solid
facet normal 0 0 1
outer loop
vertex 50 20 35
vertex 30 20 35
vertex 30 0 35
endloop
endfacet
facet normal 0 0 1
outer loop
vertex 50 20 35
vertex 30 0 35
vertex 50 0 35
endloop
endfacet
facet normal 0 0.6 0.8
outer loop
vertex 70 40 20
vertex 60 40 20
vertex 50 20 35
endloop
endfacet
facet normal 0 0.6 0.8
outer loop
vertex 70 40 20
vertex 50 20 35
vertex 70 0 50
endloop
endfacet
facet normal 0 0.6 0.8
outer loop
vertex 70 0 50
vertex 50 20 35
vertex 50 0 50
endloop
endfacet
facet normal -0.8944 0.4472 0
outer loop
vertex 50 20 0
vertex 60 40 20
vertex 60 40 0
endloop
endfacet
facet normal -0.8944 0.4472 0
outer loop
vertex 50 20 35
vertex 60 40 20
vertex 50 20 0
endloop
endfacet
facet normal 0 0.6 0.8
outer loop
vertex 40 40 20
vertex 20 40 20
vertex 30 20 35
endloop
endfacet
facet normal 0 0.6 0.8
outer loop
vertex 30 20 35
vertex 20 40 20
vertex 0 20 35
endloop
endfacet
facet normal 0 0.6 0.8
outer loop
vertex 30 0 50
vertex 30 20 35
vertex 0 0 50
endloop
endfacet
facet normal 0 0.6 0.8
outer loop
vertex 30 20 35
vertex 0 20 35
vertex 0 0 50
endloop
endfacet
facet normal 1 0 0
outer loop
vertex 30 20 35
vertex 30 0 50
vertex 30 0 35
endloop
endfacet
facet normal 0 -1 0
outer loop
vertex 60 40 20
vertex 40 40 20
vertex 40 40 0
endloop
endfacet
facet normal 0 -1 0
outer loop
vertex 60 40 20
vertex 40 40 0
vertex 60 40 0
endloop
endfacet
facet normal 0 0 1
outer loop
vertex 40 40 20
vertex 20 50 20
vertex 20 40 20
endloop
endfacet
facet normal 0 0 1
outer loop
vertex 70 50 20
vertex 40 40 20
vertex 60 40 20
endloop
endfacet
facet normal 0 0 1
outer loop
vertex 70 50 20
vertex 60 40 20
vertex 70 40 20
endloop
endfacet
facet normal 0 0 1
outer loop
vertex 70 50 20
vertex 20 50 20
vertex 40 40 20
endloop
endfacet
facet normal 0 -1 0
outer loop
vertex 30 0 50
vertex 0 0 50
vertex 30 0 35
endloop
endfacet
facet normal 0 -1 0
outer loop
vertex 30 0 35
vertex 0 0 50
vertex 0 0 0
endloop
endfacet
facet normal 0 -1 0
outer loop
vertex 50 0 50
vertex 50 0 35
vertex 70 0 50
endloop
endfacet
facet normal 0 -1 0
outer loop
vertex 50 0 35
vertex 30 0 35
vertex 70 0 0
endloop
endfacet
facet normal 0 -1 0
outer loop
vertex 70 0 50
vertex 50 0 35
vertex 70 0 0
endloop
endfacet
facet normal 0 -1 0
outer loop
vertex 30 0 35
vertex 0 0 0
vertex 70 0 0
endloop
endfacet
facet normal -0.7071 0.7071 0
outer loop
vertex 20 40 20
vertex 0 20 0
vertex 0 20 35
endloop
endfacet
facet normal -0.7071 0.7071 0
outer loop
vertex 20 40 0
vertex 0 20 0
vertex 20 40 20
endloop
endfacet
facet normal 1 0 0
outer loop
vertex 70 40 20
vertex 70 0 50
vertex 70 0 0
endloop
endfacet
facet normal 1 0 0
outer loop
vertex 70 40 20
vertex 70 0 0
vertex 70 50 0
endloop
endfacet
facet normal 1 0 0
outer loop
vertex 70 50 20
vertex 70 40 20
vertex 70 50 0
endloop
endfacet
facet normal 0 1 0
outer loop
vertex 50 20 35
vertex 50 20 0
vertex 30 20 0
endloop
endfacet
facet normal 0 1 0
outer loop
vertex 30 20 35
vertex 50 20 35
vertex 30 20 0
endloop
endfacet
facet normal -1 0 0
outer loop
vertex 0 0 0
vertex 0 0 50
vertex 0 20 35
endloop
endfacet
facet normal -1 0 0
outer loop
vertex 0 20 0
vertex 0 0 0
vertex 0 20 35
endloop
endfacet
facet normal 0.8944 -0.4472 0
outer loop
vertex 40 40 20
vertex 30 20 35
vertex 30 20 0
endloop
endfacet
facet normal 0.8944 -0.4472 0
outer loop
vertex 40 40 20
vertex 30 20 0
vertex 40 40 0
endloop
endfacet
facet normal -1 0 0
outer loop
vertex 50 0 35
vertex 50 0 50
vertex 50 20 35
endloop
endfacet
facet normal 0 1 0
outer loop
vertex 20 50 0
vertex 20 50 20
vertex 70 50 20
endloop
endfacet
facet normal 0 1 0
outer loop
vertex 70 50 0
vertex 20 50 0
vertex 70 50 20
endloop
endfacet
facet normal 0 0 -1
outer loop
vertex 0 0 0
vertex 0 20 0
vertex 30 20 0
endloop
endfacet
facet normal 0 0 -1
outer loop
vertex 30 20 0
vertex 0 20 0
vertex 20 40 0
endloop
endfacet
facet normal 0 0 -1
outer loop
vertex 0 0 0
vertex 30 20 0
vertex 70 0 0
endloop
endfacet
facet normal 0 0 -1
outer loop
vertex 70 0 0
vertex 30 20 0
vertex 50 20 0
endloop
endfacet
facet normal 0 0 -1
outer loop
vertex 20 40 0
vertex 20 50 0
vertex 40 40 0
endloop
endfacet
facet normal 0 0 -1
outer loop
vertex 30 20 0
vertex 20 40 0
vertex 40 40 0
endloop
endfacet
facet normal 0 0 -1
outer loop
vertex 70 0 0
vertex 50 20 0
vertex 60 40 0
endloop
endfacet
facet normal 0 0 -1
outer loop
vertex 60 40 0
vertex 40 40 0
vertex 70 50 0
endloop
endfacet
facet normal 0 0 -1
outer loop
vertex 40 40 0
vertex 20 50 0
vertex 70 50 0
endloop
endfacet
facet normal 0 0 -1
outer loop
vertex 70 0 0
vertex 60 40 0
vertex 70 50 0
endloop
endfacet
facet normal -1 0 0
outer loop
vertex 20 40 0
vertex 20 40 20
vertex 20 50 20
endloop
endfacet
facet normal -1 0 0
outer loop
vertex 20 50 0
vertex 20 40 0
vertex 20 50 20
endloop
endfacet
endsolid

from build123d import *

# Parameters (mm, degrees)
BOSS_EXTRUDE1_DEPTH = 50
SKETCH2_W           = 20
SKETCH2_H           = 20
CUT_EXTRUDE1_DEPTH  = 20
CUT_EXTRUDE2_DEPTH  = 10
SKETCH4_W           = 50
SKETCH4_H           = 10
BOSS_EXTRUDE2_DEPTH = 50
SKETCH5_W           = 50
SKETCH5_H           = 10
CUT_EXTRUDE5_DEPTH  = 30
SKETCH6_W           = 20
SKETCH6_H           = 20
BOSS_EXTRUDE4_DEPTH = 5
CUT_EXTRUDE8_DEPTH  = 40
CUT_EXTRUDE9_DEPTH  = 70


with BuildPart() as part:
    # Sketch1 → Boss-Extrude1 (new body)
    with BuildSketch(Plane.XY):
        Polygon((0, 0), (0, 20), (20, 40), (70, 40), (70, 0), align=None)
    extrude(amount=BOSS_EXTRUDE1_DEPTH)

    # Sketch2 → Cut-Extrude1 (cut)
    with BuildSketch(Plane.XY.offset(50)):
        with Locations((40, 10)):
            Rectangle(SKETCH2_W, SKETCH2_H)
    extrude(amount=-CUT_EXTRUDE1_DEPTH, mode=Mode.SUBTRACT)

    # Sketch3 → Cut-Extrude2 (cut)
    with BuildSketch(Plane.XY.offset(50)):
        Polygon((30, 20), (40, 40), (60, 40), (50, 20), align=None)
    extrude(amount=-CUT_EXTRUDE2_DEPTH, mode=Mode.SUBTRACT)

    # Sketch4 → Boss-Extrude2 (add)
    with BuildSketch(Plane.XY.offset(50)):
        with Locations((45, 45)):
            Rectangle(SKETCH4_W, SKETCH4_H)
    extrude(amount=-BOSS_EXTRUDE2_DEPTH)

    # Sketch5 → Cut-Extrude5 (cut)
    with BuildSketch(Plane.XY.offset(50)):
        with Locations((45, 45)):
            Rectangle(SKETCH5_W, SKETCH5_H)
    extrude(amount=-CUT_EXTRUDE5_DEPTH, mode=Mode.SUBTRACT)

    # Sketch6 → Boss-Extrude4 (add)
    with BuildSketch(Plane.XY.offset(30)):
        with Locations((40, 10)):
            Rectangle(SKETCH6_W, SKETCH6_H)
    extrude(amount=BOSS_EXTRUDE4_DEPTH)

    # Sketch8 → Cut-Extrude8 (cut)
    with BuildSketch(Plane.XY.offset(40)):
        Polygon((40, 40), (60, 40), (50, 20), (30, 20), align=None)
    extrude(amount=-CUT_EXTRUDE8_DEPTH, mode=Mode.SUBTRACT)

    # Sketch9 → Cut-Extrude9 (cut)
    with BuildSketch(Plane.ZY):
        Polygon((20, 40), (35, 20), (50, 20), (50, 40), align=None)
        Polygon((35, 20), (50, 0), (50, 20), align=None)
    extrude(amount=-CUT_EXTRUDE9_DEPTH, mode=Mode.SUBTRACT)


solid = part.part
